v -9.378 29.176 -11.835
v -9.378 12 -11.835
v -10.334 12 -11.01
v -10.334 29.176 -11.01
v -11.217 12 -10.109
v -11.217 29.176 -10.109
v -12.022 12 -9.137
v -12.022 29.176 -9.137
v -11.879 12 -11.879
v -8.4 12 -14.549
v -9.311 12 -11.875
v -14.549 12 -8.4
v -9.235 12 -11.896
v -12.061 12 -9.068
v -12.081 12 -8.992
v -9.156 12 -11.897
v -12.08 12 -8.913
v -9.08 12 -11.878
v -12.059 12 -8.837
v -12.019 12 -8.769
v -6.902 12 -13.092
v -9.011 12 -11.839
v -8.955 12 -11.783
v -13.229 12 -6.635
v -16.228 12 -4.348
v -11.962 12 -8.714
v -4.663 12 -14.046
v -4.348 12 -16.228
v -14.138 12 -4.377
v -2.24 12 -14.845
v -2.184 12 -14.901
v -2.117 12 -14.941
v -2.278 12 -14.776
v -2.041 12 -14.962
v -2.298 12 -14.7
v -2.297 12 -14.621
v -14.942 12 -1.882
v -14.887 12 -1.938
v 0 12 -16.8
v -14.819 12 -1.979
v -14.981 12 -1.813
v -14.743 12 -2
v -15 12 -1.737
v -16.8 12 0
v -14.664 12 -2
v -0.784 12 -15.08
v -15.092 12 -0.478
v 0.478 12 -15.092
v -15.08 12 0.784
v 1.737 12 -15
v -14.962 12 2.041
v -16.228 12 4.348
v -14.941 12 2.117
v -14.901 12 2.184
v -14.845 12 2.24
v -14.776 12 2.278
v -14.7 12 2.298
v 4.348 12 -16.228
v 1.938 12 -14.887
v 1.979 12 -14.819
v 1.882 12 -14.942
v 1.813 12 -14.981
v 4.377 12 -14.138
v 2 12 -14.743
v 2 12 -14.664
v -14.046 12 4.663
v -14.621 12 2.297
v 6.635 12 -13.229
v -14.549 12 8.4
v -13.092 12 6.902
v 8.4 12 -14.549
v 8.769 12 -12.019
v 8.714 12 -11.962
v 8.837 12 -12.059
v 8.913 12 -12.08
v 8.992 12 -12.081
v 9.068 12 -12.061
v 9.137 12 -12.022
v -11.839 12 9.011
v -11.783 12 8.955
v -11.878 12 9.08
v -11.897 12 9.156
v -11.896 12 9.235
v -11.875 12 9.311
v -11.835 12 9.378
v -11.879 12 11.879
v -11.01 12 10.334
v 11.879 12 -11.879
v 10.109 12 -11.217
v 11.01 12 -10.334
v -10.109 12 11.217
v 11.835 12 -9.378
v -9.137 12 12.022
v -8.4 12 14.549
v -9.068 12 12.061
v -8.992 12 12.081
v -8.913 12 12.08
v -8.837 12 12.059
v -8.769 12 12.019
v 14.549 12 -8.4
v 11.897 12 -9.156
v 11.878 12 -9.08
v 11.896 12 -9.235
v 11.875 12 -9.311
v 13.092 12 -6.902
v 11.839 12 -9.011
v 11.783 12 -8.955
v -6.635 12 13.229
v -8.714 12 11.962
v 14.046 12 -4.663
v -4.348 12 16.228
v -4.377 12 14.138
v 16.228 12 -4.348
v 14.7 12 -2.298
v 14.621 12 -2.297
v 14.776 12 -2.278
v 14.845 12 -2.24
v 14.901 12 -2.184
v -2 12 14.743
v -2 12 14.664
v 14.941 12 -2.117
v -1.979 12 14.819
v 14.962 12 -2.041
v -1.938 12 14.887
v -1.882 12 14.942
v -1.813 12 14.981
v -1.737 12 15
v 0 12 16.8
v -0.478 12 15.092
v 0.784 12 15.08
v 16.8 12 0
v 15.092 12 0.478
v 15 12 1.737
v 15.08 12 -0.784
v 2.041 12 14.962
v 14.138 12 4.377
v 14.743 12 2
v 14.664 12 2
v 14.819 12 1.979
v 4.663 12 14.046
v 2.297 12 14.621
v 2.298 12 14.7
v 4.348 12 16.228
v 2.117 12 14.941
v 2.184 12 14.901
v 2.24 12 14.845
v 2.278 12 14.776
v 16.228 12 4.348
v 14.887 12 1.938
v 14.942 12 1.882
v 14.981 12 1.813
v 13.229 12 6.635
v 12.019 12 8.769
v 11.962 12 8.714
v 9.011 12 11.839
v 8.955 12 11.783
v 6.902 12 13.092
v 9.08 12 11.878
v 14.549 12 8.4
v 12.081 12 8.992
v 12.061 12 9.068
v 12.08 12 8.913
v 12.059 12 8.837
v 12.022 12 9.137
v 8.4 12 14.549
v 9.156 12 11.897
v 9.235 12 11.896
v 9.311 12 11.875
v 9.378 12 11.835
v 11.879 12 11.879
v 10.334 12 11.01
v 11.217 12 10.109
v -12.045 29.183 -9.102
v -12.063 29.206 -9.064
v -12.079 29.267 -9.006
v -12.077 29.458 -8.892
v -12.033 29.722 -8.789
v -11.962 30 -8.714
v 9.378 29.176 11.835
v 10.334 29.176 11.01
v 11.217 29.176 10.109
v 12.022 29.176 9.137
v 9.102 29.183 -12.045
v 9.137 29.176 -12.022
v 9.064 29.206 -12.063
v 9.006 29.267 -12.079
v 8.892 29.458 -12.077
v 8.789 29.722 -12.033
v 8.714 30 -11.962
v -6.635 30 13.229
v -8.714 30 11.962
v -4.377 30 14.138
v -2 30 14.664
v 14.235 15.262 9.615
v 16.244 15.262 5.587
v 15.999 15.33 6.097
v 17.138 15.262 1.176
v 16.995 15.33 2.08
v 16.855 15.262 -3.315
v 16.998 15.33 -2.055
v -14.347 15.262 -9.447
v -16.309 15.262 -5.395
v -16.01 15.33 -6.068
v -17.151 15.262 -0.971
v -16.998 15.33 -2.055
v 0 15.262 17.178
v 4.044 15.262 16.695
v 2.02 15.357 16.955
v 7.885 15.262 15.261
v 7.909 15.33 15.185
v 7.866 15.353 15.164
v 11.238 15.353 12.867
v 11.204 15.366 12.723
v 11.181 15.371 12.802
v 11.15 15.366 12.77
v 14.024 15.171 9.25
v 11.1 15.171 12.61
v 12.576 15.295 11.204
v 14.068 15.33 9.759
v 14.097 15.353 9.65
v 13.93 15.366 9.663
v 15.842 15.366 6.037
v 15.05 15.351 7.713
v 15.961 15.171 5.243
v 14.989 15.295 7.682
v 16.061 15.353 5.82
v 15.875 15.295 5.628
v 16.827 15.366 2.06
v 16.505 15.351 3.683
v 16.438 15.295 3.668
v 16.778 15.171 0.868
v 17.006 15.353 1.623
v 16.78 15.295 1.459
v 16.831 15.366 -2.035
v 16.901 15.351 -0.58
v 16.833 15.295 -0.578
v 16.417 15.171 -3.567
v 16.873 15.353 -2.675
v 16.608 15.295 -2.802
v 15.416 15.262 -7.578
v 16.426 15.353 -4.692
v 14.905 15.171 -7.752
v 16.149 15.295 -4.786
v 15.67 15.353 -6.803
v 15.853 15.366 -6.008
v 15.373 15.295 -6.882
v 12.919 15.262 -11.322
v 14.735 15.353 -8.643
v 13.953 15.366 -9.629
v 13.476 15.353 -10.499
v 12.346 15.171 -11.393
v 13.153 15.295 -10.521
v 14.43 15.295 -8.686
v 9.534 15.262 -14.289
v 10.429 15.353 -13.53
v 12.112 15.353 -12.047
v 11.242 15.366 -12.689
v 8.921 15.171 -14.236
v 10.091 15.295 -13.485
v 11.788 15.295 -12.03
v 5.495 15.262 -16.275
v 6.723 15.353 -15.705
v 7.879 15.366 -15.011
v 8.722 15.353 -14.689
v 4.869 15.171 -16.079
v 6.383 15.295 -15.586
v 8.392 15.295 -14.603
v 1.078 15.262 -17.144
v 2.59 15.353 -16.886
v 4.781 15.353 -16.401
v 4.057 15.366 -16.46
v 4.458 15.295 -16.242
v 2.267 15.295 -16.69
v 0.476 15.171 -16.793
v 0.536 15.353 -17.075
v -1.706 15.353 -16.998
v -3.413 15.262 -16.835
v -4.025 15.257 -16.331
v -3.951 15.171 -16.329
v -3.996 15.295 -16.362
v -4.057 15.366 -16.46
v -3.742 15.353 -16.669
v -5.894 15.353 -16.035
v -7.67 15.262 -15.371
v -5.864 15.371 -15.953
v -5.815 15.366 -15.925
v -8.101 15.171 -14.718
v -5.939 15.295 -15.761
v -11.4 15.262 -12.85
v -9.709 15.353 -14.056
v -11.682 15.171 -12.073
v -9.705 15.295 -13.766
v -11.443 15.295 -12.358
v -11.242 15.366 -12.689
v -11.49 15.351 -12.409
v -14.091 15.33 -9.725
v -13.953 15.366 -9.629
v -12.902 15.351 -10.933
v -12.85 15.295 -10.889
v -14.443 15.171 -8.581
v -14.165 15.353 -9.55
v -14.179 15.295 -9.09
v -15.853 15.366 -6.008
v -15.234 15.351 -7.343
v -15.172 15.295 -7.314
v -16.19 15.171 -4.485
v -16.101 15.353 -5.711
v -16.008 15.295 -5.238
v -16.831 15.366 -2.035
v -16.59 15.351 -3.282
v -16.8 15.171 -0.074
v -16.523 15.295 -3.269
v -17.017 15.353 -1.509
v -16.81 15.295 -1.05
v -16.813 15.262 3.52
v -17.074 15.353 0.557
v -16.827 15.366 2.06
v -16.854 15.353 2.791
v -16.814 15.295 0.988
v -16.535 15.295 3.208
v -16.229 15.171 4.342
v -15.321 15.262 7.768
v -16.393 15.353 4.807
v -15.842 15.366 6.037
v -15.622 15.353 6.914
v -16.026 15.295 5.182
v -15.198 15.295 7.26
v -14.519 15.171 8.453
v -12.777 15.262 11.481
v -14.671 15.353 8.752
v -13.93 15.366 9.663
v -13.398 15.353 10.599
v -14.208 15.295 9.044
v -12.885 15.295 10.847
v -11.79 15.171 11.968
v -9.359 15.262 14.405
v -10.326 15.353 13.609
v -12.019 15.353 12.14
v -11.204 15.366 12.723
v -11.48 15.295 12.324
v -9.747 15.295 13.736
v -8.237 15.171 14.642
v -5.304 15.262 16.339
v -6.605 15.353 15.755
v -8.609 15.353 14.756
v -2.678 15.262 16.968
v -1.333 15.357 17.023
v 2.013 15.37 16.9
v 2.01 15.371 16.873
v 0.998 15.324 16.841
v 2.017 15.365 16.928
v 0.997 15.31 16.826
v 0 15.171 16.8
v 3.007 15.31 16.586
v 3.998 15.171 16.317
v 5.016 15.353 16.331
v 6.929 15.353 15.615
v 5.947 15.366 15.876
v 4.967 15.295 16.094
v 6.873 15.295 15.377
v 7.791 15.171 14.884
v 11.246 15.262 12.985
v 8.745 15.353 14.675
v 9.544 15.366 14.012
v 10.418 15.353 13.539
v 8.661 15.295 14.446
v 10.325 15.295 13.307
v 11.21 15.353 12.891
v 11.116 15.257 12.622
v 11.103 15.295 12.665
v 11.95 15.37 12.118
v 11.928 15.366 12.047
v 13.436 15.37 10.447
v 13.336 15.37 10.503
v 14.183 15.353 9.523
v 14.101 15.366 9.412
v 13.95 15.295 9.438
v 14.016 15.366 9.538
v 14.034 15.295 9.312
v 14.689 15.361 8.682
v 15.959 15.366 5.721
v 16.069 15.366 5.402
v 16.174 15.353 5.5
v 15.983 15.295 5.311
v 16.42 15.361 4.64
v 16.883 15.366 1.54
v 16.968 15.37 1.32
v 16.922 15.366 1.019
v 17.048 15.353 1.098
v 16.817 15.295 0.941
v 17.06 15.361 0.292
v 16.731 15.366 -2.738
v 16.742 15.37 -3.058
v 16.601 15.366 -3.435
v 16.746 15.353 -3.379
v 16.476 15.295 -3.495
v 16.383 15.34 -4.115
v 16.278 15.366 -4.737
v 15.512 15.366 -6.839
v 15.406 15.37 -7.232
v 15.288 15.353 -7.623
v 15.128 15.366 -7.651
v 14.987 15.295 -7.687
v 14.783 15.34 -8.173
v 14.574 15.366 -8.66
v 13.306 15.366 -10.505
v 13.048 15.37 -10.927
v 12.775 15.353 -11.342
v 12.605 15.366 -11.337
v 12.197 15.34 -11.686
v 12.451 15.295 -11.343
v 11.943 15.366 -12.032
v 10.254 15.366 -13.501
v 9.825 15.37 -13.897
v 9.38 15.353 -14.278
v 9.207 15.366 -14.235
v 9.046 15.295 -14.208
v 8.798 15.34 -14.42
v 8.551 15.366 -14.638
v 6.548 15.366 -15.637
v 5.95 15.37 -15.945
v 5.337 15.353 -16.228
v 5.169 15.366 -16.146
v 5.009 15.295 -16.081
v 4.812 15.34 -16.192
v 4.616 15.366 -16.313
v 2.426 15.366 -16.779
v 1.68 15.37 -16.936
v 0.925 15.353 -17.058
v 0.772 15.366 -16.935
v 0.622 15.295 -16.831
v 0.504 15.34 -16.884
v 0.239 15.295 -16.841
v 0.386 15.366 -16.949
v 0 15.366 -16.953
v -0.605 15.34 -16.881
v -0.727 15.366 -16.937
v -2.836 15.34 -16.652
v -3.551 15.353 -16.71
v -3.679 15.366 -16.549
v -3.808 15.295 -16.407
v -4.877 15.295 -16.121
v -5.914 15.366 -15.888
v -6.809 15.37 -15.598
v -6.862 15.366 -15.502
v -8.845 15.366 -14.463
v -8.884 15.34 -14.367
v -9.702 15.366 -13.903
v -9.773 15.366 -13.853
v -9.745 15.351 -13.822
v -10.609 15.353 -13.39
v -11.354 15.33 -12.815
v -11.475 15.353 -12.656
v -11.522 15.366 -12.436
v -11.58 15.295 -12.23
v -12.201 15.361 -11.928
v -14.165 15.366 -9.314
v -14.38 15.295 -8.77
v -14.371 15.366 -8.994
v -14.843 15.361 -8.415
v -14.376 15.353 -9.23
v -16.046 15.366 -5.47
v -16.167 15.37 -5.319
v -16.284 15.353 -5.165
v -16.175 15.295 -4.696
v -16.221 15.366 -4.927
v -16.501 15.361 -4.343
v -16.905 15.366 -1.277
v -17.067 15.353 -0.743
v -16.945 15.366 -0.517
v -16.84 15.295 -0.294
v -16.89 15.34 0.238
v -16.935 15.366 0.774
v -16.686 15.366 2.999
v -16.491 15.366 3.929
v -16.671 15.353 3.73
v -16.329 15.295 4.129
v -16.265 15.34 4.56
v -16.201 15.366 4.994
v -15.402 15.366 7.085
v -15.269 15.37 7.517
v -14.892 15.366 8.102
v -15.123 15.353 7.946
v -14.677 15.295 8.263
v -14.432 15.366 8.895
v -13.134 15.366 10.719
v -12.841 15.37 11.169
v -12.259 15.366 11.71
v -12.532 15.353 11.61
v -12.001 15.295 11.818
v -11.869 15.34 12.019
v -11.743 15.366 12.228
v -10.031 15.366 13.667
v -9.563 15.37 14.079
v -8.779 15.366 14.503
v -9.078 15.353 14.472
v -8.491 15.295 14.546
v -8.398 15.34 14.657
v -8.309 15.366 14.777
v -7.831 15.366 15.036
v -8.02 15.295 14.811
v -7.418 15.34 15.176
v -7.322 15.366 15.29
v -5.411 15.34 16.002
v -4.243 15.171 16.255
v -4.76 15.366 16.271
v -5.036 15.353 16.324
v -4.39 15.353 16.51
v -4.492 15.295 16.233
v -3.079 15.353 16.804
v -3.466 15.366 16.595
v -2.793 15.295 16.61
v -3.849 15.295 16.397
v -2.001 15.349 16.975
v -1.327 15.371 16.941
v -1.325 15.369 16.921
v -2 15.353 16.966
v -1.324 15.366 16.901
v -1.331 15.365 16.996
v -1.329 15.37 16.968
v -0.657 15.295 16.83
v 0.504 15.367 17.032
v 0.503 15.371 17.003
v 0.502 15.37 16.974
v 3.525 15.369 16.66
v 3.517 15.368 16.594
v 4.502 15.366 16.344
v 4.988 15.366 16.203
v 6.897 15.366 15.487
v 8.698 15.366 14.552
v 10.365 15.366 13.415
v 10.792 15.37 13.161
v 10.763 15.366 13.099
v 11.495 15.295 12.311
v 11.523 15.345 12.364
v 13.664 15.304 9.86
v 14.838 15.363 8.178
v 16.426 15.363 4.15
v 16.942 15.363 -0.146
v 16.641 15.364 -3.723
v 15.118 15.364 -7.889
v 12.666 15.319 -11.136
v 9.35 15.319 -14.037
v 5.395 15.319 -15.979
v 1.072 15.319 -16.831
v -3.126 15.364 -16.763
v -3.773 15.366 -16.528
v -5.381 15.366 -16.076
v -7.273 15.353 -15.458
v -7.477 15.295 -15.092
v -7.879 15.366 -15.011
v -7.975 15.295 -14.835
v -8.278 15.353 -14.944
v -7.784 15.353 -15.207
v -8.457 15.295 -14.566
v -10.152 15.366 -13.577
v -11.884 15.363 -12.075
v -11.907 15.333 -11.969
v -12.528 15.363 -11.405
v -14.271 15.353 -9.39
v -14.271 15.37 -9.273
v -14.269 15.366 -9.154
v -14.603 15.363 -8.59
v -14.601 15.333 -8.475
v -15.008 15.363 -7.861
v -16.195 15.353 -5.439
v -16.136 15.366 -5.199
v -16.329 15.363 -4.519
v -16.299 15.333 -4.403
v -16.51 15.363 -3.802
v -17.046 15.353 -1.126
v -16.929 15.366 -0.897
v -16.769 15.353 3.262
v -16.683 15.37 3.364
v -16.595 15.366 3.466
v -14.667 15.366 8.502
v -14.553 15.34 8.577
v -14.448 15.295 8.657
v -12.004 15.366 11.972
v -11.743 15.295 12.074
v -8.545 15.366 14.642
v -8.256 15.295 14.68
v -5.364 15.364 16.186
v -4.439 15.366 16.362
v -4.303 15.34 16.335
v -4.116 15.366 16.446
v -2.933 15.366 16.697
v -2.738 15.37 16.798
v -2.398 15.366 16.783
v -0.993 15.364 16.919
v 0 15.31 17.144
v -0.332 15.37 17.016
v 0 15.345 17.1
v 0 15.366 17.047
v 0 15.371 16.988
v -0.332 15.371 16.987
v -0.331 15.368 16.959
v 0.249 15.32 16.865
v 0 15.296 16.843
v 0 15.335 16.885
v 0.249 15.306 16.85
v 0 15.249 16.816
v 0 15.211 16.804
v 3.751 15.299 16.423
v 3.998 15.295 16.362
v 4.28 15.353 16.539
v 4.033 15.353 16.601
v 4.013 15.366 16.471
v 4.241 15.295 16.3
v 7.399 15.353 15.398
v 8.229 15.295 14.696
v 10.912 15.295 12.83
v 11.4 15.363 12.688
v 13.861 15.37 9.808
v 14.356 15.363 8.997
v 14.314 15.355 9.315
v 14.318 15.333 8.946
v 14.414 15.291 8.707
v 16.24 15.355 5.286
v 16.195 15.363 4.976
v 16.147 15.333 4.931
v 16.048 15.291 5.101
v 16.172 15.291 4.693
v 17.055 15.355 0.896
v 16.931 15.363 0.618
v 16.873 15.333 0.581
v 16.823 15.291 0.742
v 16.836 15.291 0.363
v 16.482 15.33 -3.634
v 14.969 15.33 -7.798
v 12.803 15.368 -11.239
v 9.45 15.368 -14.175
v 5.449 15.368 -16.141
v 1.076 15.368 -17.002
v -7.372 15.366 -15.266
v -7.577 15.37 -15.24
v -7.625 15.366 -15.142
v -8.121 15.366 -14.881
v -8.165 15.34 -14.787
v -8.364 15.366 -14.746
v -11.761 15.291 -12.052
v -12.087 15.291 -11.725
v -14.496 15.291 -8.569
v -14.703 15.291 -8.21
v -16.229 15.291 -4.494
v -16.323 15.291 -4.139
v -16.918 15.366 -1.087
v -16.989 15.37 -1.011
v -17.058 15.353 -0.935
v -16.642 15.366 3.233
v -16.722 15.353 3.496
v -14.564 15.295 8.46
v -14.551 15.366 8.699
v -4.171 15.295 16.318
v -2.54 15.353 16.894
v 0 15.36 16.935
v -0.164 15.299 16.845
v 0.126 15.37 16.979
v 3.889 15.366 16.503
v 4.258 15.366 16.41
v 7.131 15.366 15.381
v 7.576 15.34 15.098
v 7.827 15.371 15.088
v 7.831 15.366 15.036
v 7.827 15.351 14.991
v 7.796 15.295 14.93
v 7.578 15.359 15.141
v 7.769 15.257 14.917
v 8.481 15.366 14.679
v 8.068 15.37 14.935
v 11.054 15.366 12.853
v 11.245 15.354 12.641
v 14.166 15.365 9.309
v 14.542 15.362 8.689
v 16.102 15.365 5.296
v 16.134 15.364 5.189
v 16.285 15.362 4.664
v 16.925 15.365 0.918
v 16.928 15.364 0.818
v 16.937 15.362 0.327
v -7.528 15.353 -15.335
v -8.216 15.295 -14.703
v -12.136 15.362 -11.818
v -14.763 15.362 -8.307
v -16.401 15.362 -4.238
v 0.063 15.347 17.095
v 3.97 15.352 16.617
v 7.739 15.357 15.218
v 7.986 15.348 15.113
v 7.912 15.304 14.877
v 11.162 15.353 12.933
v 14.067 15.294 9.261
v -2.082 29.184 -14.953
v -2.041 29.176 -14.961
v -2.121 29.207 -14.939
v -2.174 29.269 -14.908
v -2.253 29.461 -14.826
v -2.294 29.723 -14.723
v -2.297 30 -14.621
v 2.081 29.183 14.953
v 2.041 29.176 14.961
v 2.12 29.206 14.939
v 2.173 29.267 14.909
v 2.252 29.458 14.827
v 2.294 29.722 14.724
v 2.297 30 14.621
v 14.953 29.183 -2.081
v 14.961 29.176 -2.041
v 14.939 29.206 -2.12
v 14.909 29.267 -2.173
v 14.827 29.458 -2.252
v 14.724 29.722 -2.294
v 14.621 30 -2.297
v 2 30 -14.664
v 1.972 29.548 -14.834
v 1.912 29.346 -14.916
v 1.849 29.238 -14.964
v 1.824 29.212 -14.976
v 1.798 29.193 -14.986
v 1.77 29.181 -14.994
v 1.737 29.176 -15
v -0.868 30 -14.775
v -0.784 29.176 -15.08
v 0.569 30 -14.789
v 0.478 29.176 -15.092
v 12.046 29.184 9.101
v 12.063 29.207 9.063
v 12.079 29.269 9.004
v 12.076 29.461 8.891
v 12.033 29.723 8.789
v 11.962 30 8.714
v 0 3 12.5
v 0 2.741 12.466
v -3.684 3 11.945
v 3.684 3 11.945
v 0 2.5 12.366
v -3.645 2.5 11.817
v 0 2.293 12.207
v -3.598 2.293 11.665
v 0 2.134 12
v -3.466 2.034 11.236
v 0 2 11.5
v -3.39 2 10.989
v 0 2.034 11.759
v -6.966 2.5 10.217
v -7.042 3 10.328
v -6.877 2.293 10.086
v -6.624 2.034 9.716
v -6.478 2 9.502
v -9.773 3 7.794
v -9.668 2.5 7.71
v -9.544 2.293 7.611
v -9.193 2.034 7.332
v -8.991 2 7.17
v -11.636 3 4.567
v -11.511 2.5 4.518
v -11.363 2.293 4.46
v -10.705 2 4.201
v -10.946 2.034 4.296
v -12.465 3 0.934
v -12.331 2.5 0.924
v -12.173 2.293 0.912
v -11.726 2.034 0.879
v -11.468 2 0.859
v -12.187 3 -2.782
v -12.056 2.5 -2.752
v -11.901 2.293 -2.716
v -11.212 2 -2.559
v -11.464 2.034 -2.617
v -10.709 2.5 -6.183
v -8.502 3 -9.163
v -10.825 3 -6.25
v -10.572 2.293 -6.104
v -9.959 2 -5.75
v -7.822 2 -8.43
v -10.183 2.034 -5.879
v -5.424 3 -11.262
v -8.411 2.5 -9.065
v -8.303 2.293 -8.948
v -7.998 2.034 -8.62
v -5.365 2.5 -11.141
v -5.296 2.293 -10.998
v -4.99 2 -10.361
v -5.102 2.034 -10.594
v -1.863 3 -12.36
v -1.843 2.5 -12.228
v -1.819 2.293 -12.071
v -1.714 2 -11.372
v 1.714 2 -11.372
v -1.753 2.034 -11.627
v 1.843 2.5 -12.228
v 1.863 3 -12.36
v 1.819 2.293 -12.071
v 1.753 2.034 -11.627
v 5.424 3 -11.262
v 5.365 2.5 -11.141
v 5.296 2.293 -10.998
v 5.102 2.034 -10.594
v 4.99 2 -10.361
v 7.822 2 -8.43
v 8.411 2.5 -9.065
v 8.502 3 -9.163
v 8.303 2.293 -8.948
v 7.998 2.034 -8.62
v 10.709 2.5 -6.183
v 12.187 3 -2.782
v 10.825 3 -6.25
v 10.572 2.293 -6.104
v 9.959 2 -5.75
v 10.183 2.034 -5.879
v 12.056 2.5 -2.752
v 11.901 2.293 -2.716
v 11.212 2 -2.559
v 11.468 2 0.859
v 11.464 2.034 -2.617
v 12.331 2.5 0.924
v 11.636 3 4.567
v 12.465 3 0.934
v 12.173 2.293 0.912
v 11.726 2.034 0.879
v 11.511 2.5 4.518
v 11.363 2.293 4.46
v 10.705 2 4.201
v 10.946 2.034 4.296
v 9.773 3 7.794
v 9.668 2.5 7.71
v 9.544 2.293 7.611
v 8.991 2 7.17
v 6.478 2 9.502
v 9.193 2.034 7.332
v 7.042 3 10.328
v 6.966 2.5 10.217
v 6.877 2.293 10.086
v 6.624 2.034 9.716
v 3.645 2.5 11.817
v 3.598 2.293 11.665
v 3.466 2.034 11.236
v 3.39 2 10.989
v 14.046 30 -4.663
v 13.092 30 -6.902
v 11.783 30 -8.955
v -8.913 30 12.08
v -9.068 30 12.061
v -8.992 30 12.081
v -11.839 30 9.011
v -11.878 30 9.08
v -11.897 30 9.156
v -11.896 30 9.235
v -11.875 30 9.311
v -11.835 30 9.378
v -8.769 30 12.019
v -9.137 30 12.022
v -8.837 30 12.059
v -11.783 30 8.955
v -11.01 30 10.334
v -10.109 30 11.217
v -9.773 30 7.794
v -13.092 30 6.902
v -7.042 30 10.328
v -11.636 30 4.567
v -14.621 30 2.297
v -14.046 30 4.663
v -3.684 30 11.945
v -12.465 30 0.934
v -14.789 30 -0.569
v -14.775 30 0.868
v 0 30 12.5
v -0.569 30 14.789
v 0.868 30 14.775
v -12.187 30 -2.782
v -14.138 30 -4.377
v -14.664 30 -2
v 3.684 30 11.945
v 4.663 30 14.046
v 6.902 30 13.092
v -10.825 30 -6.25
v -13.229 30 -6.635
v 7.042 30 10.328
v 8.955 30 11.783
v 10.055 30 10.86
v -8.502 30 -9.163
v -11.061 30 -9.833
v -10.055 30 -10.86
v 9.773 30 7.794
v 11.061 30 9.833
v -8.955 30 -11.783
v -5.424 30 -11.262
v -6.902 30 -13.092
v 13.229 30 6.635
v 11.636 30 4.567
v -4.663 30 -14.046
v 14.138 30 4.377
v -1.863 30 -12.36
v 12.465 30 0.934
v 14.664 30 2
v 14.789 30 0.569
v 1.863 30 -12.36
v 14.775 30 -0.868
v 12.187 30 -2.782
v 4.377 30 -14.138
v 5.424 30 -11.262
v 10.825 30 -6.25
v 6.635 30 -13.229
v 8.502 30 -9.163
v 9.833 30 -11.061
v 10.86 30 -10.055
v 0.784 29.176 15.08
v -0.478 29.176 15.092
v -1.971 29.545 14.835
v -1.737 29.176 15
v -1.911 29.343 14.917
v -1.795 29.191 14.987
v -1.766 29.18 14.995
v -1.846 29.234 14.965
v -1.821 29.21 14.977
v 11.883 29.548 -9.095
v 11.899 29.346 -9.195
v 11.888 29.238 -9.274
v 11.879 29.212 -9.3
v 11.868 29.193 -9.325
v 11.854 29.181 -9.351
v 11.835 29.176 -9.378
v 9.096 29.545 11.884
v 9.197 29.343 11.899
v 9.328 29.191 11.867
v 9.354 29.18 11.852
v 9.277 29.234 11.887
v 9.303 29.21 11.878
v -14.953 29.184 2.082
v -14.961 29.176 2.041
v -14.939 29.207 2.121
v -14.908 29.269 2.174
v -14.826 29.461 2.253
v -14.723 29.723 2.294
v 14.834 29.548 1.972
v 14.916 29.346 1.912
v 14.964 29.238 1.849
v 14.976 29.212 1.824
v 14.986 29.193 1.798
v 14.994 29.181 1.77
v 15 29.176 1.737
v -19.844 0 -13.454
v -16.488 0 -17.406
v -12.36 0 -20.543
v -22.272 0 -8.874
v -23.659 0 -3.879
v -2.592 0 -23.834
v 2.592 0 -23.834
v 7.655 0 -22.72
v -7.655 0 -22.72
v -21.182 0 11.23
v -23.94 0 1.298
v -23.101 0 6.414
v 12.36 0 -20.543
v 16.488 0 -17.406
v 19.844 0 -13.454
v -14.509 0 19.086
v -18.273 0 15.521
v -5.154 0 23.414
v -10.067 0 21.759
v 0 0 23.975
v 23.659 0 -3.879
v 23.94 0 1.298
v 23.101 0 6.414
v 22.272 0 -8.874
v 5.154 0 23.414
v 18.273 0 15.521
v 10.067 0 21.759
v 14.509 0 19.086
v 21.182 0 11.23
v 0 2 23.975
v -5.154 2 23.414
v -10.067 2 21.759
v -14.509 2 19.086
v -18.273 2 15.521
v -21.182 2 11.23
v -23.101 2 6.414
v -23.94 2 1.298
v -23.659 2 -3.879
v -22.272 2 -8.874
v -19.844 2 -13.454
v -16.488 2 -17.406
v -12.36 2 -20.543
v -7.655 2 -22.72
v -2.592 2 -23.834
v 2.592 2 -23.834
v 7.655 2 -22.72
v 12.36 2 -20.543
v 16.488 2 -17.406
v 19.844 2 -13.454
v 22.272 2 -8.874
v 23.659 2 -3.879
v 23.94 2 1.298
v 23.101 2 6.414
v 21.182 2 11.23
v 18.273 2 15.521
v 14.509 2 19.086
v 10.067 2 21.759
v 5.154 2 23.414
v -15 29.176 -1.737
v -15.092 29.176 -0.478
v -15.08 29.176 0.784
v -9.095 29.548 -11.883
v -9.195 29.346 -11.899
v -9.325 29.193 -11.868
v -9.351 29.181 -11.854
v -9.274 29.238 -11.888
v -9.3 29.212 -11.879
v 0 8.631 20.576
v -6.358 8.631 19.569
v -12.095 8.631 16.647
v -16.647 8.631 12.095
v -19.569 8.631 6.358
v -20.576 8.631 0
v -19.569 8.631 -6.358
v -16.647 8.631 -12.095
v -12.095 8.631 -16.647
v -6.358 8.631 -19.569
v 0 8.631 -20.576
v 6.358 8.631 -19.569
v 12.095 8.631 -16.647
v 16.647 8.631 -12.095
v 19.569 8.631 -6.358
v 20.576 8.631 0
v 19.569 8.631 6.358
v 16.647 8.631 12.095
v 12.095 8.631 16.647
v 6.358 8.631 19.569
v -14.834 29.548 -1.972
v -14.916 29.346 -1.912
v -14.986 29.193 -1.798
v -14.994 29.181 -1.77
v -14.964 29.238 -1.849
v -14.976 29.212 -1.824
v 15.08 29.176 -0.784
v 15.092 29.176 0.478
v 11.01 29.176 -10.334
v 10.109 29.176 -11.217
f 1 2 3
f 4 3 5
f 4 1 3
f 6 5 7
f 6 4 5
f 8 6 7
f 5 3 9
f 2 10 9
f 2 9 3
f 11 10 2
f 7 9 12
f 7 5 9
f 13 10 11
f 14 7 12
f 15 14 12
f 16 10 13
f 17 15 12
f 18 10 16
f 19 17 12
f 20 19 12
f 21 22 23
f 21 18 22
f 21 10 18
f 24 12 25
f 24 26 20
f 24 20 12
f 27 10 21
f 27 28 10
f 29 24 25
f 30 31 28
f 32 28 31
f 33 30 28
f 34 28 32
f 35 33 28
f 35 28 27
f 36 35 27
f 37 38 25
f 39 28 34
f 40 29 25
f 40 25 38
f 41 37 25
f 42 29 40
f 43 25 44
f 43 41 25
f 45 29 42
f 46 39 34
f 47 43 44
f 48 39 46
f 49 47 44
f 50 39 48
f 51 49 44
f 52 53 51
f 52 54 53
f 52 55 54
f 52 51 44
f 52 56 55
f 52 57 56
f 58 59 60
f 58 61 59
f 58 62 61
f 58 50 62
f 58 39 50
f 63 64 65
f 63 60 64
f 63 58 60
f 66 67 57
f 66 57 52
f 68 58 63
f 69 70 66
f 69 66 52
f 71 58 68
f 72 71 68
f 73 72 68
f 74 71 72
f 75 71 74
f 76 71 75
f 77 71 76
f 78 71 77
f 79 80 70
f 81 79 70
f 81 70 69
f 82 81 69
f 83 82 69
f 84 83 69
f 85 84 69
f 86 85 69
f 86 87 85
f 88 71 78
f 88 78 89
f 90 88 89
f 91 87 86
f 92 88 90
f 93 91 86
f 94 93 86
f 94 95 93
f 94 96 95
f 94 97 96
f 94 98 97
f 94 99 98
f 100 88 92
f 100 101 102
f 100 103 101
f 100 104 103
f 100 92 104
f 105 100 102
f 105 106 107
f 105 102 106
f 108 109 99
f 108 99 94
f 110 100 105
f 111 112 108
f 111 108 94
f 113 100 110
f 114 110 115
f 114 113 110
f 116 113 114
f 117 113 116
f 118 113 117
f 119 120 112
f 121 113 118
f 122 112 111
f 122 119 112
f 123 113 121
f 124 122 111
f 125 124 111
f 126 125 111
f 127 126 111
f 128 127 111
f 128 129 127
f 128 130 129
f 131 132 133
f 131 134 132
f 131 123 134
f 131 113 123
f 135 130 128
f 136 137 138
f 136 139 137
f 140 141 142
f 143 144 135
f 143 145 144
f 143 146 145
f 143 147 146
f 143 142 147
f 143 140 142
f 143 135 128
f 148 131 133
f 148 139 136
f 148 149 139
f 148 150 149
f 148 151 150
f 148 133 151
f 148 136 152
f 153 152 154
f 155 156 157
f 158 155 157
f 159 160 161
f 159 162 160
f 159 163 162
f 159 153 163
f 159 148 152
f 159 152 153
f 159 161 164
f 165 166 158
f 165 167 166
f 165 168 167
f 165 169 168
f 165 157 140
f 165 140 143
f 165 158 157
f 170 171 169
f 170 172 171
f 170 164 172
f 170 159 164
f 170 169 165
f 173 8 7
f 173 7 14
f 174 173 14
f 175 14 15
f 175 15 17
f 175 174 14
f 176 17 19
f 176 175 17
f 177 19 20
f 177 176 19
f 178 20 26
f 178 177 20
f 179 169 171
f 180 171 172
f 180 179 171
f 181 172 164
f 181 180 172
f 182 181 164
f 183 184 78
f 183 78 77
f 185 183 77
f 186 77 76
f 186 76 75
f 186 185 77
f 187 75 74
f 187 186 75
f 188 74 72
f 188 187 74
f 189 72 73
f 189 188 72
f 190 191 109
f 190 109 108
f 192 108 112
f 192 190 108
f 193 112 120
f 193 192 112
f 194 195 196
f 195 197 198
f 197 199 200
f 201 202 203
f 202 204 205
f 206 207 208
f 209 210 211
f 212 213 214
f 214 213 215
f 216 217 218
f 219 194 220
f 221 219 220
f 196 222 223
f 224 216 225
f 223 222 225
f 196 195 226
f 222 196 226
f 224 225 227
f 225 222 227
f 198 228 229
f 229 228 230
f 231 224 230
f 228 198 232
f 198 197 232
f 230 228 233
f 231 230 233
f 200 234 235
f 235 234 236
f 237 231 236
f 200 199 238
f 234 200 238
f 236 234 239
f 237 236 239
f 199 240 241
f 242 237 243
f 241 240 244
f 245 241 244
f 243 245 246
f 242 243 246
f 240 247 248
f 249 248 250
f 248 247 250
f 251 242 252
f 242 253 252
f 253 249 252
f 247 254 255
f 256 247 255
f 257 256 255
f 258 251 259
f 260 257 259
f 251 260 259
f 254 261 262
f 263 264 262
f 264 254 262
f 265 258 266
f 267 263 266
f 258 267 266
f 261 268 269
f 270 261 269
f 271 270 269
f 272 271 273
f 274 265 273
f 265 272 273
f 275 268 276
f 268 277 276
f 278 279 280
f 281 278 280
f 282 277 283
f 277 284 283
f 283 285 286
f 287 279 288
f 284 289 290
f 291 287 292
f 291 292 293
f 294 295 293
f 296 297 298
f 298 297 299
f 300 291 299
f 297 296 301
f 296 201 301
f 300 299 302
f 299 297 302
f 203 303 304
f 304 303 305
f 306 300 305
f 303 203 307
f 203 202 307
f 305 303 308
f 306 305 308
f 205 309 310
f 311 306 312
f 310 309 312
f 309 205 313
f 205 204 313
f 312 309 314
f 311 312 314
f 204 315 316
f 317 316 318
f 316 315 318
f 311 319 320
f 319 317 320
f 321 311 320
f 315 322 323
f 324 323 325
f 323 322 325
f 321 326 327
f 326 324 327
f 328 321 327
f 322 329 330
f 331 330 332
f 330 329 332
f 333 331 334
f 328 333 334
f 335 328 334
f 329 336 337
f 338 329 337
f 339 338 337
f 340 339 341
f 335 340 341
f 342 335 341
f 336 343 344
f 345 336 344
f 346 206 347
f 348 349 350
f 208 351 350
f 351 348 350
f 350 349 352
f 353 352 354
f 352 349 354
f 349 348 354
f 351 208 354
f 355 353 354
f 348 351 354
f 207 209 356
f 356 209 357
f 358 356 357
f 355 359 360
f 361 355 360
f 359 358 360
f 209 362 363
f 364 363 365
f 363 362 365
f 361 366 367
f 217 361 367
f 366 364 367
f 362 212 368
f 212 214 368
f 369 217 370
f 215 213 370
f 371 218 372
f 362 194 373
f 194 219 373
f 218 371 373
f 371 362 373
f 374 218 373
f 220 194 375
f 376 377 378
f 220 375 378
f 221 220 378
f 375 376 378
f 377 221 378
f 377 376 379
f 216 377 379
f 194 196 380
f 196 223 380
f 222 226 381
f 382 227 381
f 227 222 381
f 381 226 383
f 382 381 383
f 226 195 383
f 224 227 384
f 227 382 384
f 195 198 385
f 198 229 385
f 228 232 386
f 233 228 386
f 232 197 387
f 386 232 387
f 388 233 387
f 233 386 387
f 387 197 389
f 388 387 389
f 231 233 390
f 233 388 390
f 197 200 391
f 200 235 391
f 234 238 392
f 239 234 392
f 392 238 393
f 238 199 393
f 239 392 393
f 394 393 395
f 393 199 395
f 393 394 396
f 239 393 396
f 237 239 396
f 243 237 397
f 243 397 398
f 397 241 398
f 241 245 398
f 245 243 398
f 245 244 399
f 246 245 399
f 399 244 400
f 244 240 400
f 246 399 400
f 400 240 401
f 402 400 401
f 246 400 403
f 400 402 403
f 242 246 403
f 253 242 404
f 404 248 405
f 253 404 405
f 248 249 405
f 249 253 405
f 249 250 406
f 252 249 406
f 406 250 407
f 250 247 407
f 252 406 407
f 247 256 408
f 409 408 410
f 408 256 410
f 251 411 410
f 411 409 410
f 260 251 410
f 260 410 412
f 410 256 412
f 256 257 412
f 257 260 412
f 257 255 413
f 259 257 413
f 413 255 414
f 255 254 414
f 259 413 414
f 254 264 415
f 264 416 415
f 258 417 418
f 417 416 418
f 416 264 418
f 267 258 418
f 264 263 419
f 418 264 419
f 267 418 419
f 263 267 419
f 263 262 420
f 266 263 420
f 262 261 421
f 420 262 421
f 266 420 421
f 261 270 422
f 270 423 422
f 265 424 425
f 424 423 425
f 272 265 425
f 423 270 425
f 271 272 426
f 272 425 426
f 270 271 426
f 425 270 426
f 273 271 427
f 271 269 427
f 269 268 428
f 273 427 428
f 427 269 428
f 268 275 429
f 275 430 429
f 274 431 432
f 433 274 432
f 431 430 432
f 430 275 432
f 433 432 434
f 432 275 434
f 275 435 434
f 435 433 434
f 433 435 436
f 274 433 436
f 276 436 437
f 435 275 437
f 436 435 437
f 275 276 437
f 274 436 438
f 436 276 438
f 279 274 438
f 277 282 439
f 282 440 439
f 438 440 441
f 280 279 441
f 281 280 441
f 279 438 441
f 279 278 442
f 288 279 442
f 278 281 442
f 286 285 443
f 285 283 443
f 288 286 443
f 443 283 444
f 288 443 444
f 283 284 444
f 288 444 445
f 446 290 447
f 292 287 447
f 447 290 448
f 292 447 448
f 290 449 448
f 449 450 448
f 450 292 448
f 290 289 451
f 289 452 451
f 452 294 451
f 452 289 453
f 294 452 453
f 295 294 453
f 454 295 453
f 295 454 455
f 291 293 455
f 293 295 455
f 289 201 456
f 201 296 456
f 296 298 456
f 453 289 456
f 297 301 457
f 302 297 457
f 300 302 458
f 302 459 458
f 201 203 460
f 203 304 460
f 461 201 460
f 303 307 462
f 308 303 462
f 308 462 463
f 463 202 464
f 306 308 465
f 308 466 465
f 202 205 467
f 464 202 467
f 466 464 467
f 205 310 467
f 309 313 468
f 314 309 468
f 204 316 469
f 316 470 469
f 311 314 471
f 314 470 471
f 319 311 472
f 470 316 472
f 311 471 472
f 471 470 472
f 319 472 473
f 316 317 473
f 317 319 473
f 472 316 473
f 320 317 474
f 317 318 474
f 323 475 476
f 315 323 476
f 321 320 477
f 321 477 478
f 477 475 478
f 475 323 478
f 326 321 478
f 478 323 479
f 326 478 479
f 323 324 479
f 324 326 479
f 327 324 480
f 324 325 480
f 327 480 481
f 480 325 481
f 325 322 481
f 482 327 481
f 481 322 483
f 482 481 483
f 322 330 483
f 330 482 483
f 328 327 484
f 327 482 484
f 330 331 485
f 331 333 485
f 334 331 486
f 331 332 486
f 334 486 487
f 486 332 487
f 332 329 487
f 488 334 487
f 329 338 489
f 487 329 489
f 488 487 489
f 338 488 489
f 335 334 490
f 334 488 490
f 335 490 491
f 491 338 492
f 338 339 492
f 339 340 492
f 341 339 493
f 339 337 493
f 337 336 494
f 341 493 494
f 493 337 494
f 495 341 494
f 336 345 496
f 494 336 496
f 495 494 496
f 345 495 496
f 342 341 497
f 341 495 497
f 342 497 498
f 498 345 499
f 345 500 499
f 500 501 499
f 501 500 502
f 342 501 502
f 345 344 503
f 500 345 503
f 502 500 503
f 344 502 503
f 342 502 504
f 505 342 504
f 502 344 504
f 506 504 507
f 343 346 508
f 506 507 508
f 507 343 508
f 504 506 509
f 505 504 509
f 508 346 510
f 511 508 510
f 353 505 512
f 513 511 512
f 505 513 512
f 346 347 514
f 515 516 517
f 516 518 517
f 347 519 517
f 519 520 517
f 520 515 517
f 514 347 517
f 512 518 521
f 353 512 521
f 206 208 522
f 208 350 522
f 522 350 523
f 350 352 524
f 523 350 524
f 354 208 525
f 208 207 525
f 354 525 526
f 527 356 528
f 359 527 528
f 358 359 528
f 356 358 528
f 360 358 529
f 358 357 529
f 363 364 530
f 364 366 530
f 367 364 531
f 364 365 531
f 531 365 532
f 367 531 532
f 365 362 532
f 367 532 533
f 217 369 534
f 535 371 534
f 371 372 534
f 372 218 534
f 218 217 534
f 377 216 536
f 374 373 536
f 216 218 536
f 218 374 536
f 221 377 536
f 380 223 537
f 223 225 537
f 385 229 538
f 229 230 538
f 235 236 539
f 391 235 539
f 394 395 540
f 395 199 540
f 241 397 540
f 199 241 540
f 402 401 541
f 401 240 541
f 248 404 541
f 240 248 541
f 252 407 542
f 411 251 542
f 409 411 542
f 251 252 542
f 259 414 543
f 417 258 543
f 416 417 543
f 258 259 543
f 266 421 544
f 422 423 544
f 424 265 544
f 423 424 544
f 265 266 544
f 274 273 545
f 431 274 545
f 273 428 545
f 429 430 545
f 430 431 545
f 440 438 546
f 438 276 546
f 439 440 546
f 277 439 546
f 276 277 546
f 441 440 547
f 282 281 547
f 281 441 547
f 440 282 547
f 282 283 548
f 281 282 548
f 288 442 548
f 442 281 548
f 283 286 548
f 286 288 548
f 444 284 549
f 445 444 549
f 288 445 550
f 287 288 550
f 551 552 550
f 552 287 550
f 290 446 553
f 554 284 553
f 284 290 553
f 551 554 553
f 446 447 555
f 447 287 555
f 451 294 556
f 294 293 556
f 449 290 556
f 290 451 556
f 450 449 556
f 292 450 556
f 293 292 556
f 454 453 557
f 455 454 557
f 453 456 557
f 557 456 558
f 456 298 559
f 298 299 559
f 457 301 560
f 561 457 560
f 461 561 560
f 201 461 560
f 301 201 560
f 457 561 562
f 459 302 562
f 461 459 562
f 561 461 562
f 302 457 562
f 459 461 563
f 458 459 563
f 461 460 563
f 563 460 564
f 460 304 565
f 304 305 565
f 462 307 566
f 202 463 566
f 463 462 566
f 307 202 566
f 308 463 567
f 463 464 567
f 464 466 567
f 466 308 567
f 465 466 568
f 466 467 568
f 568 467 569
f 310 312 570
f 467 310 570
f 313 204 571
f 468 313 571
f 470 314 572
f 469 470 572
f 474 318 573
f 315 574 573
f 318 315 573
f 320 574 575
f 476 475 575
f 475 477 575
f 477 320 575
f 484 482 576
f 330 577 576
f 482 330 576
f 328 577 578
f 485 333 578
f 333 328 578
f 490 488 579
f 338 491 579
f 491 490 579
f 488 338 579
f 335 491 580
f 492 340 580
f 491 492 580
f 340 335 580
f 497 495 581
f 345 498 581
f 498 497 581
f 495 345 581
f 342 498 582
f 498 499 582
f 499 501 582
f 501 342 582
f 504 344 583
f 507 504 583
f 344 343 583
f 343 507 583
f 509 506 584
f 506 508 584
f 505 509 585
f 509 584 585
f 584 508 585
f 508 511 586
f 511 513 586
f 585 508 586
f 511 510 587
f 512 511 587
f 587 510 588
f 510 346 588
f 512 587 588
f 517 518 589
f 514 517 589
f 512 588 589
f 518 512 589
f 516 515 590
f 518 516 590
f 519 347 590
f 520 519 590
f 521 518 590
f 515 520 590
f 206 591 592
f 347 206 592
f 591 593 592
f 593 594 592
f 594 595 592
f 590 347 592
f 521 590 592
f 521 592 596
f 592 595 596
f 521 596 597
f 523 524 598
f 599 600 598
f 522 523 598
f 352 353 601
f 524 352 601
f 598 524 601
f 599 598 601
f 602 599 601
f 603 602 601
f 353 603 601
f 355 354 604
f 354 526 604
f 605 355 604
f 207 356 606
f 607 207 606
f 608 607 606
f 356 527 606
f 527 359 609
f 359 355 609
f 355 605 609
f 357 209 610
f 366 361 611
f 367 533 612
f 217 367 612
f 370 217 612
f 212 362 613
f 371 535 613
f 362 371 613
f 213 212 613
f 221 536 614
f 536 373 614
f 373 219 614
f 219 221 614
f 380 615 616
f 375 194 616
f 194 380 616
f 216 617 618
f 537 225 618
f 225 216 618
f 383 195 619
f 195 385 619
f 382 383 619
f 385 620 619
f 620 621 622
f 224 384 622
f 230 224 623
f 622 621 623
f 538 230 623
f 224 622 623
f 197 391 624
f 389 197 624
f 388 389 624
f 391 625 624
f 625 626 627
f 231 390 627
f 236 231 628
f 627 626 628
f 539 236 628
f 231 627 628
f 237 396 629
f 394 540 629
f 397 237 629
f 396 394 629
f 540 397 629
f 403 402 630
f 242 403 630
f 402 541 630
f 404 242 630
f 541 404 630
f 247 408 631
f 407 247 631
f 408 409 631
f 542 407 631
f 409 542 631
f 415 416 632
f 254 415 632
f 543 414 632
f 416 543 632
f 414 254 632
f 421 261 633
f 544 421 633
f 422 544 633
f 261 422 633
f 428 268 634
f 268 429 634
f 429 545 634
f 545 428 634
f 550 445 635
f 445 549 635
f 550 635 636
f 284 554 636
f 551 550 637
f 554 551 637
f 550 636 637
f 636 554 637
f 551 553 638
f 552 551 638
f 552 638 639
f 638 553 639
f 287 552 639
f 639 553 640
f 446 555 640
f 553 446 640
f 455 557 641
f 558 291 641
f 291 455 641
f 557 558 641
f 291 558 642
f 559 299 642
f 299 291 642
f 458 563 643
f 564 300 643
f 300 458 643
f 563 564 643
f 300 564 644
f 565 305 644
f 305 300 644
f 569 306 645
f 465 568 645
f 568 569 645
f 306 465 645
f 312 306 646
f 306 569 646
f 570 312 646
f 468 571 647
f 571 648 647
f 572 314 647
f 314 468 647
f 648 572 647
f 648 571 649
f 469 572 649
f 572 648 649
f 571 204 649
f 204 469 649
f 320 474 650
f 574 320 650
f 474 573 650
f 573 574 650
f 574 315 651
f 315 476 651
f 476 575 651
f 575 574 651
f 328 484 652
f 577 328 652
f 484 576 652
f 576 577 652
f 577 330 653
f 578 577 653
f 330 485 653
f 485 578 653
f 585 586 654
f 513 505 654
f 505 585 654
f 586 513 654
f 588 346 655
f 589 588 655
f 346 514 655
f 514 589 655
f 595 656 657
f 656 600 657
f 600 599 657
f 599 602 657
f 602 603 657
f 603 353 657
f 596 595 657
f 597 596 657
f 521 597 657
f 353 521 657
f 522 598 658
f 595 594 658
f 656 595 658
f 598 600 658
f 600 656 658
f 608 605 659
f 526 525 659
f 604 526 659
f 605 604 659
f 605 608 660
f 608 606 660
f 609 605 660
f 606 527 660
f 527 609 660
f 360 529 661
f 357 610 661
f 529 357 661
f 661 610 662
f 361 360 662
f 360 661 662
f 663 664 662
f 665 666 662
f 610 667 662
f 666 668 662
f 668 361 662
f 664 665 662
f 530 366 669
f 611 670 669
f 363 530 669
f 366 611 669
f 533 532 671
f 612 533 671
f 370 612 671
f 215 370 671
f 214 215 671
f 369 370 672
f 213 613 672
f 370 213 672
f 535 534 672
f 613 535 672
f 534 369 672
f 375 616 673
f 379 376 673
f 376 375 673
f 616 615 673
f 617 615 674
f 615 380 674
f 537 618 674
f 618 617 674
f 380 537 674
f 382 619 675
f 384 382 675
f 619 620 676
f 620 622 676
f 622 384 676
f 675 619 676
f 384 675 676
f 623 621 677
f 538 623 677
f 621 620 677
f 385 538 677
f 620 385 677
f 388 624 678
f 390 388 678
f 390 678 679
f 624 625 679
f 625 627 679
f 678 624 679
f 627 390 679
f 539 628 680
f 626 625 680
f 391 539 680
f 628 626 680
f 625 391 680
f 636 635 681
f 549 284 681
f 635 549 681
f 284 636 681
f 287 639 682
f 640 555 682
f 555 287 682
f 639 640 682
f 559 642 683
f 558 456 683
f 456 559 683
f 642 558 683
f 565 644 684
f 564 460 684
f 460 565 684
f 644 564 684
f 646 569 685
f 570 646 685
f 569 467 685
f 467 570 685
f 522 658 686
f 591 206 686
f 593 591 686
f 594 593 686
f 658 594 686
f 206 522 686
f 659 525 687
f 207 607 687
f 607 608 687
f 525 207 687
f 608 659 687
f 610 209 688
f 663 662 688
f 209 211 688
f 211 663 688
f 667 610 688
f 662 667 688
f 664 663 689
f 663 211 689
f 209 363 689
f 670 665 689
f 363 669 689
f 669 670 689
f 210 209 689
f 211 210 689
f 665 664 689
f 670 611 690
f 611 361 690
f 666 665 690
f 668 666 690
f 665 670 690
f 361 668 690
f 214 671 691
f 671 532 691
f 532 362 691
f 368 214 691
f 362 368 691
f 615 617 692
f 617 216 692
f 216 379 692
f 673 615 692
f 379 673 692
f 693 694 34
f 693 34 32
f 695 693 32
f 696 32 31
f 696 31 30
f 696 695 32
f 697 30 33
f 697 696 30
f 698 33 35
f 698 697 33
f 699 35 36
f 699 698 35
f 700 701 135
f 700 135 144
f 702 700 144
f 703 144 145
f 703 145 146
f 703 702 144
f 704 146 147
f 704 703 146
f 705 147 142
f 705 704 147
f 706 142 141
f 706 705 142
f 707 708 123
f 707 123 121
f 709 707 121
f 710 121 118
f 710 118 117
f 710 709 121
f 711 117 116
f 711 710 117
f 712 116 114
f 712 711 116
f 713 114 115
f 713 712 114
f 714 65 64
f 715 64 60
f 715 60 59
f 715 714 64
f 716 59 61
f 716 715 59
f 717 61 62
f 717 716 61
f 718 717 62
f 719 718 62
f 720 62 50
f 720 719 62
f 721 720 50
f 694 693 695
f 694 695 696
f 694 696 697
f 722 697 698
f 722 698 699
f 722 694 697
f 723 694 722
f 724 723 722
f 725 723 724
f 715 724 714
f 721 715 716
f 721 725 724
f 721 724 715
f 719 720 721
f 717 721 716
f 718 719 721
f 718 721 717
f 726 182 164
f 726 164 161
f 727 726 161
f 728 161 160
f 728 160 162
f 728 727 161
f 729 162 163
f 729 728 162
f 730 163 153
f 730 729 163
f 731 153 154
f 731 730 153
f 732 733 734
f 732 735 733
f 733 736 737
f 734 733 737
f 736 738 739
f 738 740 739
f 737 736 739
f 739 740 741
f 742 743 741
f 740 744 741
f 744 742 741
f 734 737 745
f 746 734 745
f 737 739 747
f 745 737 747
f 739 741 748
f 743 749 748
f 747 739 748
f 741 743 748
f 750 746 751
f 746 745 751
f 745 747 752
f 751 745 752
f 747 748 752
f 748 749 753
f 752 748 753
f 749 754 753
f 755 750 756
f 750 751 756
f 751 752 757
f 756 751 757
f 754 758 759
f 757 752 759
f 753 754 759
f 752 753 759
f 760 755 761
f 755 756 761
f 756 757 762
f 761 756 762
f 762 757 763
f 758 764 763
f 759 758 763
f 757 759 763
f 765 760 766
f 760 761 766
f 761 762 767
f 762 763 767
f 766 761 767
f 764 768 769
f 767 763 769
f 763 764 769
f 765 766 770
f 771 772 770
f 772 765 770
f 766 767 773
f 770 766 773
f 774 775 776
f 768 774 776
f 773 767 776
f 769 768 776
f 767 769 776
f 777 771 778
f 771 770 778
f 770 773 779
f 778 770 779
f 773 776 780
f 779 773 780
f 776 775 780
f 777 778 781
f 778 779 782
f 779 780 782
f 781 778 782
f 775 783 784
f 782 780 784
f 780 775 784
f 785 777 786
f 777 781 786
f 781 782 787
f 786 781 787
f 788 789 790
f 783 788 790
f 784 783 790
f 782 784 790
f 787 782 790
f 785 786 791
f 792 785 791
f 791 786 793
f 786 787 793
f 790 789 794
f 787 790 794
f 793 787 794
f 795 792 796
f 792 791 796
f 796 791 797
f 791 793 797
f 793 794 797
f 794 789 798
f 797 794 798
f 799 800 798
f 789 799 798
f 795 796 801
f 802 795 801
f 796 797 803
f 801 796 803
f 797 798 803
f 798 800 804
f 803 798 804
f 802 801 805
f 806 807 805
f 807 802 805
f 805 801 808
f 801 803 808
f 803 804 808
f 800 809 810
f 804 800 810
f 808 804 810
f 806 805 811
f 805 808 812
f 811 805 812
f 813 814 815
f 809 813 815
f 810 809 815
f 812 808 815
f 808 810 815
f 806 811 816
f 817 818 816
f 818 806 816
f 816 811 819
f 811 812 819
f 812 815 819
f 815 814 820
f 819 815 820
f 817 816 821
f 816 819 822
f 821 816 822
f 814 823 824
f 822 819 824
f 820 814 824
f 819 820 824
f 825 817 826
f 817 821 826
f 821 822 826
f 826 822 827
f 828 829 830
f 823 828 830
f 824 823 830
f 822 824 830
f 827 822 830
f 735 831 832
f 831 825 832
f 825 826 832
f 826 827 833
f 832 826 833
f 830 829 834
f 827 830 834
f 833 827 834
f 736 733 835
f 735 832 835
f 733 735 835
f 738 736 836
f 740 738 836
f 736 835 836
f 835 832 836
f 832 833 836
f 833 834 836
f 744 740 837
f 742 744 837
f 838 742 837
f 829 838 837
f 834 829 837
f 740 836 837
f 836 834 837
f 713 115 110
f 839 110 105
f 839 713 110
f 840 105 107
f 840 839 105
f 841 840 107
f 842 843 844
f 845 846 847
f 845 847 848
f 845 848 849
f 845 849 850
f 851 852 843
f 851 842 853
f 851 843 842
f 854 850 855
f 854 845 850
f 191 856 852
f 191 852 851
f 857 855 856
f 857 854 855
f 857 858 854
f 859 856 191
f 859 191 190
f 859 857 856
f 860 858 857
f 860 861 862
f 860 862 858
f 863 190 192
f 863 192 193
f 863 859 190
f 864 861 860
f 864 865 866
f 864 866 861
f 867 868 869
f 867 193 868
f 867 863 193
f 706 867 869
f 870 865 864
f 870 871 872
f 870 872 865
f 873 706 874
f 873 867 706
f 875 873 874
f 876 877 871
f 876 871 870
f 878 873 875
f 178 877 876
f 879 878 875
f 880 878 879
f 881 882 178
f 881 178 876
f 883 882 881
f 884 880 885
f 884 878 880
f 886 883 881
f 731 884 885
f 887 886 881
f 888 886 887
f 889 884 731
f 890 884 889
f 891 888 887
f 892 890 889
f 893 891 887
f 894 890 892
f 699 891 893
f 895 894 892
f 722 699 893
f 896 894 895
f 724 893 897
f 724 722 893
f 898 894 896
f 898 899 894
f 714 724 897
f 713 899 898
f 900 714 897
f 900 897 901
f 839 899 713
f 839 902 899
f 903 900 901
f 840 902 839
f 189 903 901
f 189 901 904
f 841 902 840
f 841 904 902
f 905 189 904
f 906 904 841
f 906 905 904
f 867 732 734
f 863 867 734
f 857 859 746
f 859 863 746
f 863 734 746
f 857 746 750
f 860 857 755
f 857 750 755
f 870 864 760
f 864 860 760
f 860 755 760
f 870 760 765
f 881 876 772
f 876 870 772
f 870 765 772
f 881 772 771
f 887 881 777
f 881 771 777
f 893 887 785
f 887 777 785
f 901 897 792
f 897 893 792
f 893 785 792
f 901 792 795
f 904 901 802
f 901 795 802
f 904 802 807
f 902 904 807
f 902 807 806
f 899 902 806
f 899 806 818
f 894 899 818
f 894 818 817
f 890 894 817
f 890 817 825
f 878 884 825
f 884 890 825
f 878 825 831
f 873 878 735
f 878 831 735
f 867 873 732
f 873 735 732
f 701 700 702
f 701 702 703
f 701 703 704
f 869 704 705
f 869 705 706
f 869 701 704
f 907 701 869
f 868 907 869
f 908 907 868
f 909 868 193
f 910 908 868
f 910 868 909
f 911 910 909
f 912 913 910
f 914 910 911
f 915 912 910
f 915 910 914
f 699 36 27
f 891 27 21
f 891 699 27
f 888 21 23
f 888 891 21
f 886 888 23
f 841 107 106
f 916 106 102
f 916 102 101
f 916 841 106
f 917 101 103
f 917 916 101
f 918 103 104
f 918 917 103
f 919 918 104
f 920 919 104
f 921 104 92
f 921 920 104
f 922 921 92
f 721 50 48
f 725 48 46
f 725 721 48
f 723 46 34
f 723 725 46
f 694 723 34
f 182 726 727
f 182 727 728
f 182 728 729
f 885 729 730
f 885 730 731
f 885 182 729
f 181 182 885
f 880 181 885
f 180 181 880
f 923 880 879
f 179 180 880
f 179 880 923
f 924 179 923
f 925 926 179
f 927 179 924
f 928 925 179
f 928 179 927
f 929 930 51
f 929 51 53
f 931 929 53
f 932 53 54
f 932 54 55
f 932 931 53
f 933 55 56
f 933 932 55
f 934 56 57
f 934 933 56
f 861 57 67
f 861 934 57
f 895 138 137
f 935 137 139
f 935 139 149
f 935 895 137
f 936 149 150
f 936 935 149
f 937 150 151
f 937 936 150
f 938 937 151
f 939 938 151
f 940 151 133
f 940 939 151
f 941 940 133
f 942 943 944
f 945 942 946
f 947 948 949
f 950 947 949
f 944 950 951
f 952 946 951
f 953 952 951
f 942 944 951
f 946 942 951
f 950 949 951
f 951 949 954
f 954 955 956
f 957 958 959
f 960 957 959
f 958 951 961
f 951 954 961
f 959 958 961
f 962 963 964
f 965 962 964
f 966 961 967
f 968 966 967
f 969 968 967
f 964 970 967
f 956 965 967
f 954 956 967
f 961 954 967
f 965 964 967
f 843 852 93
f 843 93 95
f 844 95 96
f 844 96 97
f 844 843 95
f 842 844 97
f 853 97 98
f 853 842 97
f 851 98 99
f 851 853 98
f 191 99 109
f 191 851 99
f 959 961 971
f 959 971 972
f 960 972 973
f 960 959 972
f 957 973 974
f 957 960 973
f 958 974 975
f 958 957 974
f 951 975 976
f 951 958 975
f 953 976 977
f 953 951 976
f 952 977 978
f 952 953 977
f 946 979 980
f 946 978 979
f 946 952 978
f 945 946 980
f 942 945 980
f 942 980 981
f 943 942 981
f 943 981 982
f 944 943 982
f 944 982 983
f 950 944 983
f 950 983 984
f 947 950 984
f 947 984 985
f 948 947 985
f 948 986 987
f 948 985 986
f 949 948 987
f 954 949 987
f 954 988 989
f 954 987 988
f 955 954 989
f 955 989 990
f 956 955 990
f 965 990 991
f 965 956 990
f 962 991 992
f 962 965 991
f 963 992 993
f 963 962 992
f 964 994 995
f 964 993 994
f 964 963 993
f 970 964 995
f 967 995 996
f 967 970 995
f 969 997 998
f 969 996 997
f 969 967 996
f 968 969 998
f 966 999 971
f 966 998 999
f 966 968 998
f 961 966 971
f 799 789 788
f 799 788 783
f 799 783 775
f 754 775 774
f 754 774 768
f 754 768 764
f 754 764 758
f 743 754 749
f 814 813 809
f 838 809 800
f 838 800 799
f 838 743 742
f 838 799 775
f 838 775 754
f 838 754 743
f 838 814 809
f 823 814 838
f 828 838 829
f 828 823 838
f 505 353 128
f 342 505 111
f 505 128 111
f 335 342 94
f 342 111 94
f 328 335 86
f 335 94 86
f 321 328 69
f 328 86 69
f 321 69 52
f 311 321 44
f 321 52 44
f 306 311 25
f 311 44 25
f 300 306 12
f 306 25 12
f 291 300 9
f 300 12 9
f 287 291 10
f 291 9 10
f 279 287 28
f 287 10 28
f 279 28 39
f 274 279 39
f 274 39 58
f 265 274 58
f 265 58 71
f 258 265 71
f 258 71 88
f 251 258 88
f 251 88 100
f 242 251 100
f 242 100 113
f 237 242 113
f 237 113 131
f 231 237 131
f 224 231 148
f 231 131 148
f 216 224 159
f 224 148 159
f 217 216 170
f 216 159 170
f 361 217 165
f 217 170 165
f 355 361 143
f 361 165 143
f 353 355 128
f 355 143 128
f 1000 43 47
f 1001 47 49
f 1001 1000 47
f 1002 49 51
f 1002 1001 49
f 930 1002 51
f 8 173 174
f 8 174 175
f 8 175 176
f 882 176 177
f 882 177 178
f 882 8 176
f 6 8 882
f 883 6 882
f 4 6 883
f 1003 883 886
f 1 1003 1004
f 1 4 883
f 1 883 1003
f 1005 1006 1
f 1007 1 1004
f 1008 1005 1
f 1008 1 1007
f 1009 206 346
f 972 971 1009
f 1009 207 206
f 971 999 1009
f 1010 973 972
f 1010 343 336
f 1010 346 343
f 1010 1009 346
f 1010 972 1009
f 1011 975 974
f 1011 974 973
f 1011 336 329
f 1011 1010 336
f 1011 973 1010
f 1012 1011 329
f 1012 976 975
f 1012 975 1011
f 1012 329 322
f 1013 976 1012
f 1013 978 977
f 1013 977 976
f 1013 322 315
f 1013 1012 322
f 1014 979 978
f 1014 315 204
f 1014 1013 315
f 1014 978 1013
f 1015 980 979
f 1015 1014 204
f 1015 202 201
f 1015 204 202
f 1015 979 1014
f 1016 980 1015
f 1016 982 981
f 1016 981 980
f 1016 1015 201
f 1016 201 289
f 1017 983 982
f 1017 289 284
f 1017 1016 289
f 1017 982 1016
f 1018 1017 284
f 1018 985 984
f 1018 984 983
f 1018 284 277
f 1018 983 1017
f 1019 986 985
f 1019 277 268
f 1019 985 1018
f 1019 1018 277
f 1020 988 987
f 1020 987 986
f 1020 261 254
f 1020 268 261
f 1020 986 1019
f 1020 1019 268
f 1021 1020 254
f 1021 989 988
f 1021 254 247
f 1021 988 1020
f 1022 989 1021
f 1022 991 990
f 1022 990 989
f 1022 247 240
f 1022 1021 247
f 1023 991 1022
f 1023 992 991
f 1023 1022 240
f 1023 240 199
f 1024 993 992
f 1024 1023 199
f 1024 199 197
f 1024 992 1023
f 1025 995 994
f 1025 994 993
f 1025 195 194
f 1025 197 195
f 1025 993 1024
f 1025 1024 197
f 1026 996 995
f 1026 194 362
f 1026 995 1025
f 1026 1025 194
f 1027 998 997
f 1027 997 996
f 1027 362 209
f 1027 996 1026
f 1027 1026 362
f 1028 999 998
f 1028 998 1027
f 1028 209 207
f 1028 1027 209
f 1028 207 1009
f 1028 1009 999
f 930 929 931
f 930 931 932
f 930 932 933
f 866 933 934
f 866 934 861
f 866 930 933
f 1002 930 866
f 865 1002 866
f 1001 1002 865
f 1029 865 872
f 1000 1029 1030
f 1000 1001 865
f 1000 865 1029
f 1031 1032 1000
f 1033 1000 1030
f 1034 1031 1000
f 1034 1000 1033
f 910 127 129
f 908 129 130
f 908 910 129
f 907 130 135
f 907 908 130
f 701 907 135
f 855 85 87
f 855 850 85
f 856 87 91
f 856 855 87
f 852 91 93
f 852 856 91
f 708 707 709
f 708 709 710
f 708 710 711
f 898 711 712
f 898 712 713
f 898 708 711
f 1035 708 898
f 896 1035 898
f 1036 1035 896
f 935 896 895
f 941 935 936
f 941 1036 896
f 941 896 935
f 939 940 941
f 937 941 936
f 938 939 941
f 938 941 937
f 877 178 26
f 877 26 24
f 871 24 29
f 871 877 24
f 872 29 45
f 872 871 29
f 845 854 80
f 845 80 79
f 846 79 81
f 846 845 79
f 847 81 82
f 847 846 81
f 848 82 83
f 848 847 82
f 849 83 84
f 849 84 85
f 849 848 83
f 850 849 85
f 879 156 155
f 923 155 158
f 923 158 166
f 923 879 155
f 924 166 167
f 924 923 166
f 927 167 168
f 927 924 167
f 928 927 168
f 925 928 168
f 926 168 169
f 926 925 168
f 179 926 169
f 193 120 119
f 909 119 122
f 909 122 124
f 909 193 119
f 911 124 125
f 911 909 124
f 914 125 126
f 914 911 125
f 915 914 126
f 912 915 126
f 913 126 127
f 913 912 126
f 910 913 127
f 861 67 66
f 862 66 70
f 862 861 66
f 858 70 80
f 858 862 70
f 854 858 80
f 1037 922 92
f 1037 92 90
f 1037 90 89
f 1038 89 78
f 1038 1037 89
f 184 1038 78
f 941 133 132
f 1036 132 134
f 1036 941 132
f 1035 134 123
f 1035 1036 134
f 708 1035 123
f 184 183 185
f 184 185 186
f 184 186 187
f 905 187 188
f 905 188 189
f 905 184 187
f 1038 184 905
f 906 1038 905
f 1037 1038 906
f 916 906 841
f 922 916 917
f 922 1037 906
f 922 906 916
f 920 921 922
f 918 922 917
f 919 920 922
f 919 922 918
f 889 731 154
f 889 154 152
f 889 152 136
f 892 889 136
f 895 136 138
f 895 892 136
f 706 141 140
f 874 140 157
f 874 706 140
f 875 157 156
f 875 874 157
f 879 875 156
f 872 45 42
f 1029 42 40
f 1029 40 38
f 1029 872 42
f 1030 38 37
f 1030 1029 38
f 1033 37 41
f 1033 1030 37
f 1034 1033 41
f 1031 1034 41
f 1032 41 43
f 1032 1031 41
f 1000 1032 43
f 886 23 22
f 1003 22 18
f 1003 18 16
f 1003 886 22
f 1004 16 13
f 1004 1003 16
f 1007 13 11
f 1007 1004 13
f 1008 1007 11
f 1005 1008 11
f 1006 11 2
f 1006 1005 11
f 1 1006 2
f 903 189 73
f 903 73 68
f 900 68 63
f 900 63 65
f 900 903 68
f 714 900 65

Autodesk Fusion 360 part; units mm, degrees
sketch "Skizze1" plane through (0, 0, 0) normal (1, 0, 0) x (0, 0, -1)
  line L0 (0, 0) -> (-25, 0)
  line L1 (-25, 0) -> (-16.8, 16)
  line L2 (-16.8, 16) -> (-16.8, 12)
  line L3 (-16.8, 12) -> (-14.8, 12)
  line L4 (-14.8, 12) -> (-14.8, 30)
  line L5 (-14.8, 30) -> (-12.5, 30)
  line L6 (-12.5, 30) -> (-12.5, 3)
  arc A0 (-12.5, 3) -> (-11.5, 2) centre (-11.5, 3) ccw
  line L7 (-11.5, 2) -> (0, 2)
  line L8 (0, 2) -> (0, 0)
  line L9 (-23.975, 2) -> (-23.975, 0)
  dimension "d1" = 30
  dimension "d2" = 18
  dimension "d3" = 12.5
  dimension "d4" = 2
  dimension "d5" = 14.8
  dimension "d6" = 14
  dimension "d7" = 1
  dimension "d8" = 28
  dimension "d9" = 25
  dimension "d10" = 2
revolve "Drehen1" add sketch "Skizze1" angle 360 about axis through (0, 1.75, 0) along (0, 1, 0) contours L0 L1 L2 L3 L4 L5 L6 A0 L7 L8 L9
fillet "Abrundung1" radius 0.2 1 edges at (-15.6631, 16, 6.0751)
ref_plane "Arbeitsebene1" through (0, 30, 0) normal (0, 1, 0) x (0, 0, 1)
sketch "Skizze2" plane through (0, 30, 0) normal (0, 1, 0) x (1, 0, 0)
  arc A0 (-2, -14.6642) -> (2.2968, -14.6207) centre (0, 0) ccw
  arc A1 (-1.7369, -14.9998) -> (2.0405, -14.9615) centre (0, 0) ccw
  arc A2 (2.0405, -14.9615) -> (2.2968, -14.6207) centre (2, -14.6642) ccw
  arc A3 (-2, -14.6642) -> (-1.7369, -14.9998) centre (-1.7024, -14.7018) ccw
  dimension "d15" = 14.8
  dimension "d16" = 15.1
  dimension "d17" = 4
  dimension "d18" = 2
extrude "Extrusion1" add sketch "Skizze2" against normal blind 18
sketch "Skizze3" plane through (0, 0, 0) normal (1, 0, 0) x (0, 0, -1)
  line L0 (-14.8, 30) -> (-15.1, 29.1758)
  line L1 (-15.1, 29.1758) -> (-15.1, 30)
  line L2 (-15.1, 30) -> (-14.8, 30)
  dimension "d21" = 14.8
  dimension "d22" = 0.3
  dimension "d23" = 20
  dimension "d24" = 30
revolve "Drehen2" cut sketch "Skizze3" angle 360 about axis through (0, 1.75, 0) along (0, 1, 0)
pattern_circular "C-Anordnung1" count 8 over 360 about axis through (0, 1.75, 0) along (0, 1, 0) of "Drehen2", "Extrusion1"
